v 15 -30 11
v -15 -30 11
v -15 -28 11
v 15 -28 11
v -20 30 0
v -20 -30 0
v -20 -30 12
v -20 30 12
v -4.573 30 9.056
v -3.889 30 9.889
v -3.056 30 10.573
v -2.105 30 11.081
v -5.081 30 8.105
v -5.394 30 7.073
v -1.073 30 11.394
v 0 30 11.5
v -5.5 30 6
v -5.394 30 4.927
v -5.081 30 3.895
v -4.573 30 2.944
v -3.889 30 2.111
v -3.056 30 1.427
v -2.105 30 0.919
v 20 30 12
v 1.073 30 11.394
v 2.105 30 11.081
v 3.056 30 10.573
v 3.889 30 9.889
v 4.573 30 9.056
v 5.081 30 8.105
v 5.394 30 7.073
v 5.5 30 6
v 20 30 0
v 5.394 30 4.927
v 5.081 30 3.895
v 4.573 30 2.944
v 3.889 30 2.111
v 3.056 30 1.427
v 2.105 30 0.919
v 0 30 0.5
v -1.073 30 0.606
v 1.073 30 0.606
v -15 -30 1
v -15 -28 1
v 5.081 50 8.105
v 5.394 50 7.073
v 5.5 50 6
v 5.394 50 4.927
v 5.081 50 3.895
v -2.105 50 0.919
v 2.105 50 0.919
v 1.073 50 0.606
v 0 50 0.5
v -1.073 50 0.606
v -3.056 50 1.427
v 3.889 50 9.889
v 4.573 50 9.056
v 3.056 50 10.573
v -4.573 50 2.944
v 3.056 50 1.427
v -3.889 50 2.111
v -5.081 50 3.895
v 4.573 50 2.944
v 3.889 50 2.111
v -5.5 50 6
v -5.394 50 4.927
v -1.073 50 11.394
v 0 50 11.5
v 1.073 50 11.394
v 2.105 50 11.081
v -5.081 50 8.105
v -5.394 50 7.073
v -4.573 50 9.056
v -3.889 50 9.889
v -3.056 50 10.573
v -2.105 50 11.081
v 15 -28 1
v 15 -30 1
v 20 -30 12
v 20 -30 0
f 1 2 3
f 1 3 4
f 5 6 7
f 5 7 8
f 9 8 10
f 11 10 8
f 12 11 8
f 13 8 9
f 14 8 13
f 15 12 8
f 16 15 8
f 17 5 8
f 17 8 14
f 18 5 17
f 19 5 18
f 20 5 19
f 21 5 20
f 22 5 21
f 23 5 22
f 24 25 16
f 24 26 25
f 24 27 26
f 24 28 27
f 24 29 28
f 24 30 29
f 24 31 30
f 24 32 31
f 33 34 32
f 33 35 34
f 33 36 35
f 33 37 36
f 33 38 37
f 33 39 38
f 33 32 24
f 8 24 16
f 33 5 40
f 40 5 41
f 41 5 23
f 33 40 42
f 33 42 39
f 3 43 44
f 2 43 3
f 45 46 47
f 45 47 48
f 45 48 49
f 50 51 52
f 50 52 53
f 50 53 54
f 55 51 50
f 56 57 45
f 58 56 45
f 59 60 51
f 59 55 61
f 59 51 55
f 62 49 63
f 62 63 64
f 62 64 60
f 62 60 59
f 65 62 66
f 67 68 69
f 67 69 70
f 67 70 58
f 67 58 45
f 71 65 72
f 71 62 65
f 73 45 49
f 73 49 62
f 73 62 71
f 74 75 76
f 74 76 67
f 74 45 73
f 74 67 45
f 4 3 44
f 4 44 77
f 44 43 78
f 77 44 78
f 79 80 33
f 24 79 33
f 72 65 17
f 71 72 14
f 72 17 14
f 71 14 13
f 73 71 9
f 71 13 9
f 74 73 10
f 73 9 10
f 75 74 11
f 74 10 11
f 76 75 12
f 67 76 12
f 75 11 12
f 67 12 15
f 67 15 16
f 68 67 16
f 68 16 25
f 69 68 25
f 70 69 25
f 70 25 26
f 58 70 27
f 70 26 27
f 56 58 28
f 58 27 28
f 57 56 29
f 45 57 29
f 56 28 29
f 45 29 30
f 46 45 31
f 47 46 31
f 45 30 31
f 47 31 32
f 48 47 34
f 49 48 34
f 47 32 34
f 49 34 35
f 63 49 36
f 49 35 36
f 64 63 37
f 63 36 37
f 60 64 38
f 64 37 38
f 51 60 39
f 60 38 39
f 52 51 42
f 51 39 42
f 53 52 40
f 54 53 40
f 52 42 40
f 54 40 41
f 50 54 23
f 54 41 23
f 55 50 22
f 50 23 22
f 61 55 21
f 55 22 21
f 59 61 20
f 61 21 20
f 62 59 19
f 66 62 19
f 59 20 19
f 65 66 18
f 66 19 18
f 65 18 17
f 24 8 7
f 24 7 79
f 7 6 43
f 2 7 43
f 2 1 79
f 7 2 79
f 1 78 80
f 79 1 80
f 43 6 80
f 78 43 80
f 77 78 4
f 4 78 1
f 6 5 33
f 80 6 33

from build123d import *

# Parameters (mm, degrees)
F0_W     = 40
F0_H     = 60
F1_DEPTH = 12
F2_W     = 30
F2_H     = 10
F3_DEPTH = 2
F4_R     = 5.5
F5_DEPTH = 20


with BuildPart() as f1:
    # F0 (on Top) → F1 (new body)
    with BuildSketch(Plane.XY):
        Rectangle(F0_W, F0_H)
    extrude(amount=F1_DEPTH)

    # F2 (on face) → F3 (cut)
    with BuildSketch(Plane.XZ.offset(30)):
        with Locations((0, 6)):
            Rectangle(F2_W, F2_H)
    extrude(amount=-F3_DEPTH, mode=Mode.SUBTRACT)

    # F4 (on face) → F5 (join)
    with BuildSketch(Plane(origin=(0, 30, 0), x_dir=(-1, 0, 0), z_dir=(0, 1, 0))):
        with Locations((0, 6)):
            Circle(F4_R)
    extrude(amount=F5_DEPTH)


solid = f1.part
